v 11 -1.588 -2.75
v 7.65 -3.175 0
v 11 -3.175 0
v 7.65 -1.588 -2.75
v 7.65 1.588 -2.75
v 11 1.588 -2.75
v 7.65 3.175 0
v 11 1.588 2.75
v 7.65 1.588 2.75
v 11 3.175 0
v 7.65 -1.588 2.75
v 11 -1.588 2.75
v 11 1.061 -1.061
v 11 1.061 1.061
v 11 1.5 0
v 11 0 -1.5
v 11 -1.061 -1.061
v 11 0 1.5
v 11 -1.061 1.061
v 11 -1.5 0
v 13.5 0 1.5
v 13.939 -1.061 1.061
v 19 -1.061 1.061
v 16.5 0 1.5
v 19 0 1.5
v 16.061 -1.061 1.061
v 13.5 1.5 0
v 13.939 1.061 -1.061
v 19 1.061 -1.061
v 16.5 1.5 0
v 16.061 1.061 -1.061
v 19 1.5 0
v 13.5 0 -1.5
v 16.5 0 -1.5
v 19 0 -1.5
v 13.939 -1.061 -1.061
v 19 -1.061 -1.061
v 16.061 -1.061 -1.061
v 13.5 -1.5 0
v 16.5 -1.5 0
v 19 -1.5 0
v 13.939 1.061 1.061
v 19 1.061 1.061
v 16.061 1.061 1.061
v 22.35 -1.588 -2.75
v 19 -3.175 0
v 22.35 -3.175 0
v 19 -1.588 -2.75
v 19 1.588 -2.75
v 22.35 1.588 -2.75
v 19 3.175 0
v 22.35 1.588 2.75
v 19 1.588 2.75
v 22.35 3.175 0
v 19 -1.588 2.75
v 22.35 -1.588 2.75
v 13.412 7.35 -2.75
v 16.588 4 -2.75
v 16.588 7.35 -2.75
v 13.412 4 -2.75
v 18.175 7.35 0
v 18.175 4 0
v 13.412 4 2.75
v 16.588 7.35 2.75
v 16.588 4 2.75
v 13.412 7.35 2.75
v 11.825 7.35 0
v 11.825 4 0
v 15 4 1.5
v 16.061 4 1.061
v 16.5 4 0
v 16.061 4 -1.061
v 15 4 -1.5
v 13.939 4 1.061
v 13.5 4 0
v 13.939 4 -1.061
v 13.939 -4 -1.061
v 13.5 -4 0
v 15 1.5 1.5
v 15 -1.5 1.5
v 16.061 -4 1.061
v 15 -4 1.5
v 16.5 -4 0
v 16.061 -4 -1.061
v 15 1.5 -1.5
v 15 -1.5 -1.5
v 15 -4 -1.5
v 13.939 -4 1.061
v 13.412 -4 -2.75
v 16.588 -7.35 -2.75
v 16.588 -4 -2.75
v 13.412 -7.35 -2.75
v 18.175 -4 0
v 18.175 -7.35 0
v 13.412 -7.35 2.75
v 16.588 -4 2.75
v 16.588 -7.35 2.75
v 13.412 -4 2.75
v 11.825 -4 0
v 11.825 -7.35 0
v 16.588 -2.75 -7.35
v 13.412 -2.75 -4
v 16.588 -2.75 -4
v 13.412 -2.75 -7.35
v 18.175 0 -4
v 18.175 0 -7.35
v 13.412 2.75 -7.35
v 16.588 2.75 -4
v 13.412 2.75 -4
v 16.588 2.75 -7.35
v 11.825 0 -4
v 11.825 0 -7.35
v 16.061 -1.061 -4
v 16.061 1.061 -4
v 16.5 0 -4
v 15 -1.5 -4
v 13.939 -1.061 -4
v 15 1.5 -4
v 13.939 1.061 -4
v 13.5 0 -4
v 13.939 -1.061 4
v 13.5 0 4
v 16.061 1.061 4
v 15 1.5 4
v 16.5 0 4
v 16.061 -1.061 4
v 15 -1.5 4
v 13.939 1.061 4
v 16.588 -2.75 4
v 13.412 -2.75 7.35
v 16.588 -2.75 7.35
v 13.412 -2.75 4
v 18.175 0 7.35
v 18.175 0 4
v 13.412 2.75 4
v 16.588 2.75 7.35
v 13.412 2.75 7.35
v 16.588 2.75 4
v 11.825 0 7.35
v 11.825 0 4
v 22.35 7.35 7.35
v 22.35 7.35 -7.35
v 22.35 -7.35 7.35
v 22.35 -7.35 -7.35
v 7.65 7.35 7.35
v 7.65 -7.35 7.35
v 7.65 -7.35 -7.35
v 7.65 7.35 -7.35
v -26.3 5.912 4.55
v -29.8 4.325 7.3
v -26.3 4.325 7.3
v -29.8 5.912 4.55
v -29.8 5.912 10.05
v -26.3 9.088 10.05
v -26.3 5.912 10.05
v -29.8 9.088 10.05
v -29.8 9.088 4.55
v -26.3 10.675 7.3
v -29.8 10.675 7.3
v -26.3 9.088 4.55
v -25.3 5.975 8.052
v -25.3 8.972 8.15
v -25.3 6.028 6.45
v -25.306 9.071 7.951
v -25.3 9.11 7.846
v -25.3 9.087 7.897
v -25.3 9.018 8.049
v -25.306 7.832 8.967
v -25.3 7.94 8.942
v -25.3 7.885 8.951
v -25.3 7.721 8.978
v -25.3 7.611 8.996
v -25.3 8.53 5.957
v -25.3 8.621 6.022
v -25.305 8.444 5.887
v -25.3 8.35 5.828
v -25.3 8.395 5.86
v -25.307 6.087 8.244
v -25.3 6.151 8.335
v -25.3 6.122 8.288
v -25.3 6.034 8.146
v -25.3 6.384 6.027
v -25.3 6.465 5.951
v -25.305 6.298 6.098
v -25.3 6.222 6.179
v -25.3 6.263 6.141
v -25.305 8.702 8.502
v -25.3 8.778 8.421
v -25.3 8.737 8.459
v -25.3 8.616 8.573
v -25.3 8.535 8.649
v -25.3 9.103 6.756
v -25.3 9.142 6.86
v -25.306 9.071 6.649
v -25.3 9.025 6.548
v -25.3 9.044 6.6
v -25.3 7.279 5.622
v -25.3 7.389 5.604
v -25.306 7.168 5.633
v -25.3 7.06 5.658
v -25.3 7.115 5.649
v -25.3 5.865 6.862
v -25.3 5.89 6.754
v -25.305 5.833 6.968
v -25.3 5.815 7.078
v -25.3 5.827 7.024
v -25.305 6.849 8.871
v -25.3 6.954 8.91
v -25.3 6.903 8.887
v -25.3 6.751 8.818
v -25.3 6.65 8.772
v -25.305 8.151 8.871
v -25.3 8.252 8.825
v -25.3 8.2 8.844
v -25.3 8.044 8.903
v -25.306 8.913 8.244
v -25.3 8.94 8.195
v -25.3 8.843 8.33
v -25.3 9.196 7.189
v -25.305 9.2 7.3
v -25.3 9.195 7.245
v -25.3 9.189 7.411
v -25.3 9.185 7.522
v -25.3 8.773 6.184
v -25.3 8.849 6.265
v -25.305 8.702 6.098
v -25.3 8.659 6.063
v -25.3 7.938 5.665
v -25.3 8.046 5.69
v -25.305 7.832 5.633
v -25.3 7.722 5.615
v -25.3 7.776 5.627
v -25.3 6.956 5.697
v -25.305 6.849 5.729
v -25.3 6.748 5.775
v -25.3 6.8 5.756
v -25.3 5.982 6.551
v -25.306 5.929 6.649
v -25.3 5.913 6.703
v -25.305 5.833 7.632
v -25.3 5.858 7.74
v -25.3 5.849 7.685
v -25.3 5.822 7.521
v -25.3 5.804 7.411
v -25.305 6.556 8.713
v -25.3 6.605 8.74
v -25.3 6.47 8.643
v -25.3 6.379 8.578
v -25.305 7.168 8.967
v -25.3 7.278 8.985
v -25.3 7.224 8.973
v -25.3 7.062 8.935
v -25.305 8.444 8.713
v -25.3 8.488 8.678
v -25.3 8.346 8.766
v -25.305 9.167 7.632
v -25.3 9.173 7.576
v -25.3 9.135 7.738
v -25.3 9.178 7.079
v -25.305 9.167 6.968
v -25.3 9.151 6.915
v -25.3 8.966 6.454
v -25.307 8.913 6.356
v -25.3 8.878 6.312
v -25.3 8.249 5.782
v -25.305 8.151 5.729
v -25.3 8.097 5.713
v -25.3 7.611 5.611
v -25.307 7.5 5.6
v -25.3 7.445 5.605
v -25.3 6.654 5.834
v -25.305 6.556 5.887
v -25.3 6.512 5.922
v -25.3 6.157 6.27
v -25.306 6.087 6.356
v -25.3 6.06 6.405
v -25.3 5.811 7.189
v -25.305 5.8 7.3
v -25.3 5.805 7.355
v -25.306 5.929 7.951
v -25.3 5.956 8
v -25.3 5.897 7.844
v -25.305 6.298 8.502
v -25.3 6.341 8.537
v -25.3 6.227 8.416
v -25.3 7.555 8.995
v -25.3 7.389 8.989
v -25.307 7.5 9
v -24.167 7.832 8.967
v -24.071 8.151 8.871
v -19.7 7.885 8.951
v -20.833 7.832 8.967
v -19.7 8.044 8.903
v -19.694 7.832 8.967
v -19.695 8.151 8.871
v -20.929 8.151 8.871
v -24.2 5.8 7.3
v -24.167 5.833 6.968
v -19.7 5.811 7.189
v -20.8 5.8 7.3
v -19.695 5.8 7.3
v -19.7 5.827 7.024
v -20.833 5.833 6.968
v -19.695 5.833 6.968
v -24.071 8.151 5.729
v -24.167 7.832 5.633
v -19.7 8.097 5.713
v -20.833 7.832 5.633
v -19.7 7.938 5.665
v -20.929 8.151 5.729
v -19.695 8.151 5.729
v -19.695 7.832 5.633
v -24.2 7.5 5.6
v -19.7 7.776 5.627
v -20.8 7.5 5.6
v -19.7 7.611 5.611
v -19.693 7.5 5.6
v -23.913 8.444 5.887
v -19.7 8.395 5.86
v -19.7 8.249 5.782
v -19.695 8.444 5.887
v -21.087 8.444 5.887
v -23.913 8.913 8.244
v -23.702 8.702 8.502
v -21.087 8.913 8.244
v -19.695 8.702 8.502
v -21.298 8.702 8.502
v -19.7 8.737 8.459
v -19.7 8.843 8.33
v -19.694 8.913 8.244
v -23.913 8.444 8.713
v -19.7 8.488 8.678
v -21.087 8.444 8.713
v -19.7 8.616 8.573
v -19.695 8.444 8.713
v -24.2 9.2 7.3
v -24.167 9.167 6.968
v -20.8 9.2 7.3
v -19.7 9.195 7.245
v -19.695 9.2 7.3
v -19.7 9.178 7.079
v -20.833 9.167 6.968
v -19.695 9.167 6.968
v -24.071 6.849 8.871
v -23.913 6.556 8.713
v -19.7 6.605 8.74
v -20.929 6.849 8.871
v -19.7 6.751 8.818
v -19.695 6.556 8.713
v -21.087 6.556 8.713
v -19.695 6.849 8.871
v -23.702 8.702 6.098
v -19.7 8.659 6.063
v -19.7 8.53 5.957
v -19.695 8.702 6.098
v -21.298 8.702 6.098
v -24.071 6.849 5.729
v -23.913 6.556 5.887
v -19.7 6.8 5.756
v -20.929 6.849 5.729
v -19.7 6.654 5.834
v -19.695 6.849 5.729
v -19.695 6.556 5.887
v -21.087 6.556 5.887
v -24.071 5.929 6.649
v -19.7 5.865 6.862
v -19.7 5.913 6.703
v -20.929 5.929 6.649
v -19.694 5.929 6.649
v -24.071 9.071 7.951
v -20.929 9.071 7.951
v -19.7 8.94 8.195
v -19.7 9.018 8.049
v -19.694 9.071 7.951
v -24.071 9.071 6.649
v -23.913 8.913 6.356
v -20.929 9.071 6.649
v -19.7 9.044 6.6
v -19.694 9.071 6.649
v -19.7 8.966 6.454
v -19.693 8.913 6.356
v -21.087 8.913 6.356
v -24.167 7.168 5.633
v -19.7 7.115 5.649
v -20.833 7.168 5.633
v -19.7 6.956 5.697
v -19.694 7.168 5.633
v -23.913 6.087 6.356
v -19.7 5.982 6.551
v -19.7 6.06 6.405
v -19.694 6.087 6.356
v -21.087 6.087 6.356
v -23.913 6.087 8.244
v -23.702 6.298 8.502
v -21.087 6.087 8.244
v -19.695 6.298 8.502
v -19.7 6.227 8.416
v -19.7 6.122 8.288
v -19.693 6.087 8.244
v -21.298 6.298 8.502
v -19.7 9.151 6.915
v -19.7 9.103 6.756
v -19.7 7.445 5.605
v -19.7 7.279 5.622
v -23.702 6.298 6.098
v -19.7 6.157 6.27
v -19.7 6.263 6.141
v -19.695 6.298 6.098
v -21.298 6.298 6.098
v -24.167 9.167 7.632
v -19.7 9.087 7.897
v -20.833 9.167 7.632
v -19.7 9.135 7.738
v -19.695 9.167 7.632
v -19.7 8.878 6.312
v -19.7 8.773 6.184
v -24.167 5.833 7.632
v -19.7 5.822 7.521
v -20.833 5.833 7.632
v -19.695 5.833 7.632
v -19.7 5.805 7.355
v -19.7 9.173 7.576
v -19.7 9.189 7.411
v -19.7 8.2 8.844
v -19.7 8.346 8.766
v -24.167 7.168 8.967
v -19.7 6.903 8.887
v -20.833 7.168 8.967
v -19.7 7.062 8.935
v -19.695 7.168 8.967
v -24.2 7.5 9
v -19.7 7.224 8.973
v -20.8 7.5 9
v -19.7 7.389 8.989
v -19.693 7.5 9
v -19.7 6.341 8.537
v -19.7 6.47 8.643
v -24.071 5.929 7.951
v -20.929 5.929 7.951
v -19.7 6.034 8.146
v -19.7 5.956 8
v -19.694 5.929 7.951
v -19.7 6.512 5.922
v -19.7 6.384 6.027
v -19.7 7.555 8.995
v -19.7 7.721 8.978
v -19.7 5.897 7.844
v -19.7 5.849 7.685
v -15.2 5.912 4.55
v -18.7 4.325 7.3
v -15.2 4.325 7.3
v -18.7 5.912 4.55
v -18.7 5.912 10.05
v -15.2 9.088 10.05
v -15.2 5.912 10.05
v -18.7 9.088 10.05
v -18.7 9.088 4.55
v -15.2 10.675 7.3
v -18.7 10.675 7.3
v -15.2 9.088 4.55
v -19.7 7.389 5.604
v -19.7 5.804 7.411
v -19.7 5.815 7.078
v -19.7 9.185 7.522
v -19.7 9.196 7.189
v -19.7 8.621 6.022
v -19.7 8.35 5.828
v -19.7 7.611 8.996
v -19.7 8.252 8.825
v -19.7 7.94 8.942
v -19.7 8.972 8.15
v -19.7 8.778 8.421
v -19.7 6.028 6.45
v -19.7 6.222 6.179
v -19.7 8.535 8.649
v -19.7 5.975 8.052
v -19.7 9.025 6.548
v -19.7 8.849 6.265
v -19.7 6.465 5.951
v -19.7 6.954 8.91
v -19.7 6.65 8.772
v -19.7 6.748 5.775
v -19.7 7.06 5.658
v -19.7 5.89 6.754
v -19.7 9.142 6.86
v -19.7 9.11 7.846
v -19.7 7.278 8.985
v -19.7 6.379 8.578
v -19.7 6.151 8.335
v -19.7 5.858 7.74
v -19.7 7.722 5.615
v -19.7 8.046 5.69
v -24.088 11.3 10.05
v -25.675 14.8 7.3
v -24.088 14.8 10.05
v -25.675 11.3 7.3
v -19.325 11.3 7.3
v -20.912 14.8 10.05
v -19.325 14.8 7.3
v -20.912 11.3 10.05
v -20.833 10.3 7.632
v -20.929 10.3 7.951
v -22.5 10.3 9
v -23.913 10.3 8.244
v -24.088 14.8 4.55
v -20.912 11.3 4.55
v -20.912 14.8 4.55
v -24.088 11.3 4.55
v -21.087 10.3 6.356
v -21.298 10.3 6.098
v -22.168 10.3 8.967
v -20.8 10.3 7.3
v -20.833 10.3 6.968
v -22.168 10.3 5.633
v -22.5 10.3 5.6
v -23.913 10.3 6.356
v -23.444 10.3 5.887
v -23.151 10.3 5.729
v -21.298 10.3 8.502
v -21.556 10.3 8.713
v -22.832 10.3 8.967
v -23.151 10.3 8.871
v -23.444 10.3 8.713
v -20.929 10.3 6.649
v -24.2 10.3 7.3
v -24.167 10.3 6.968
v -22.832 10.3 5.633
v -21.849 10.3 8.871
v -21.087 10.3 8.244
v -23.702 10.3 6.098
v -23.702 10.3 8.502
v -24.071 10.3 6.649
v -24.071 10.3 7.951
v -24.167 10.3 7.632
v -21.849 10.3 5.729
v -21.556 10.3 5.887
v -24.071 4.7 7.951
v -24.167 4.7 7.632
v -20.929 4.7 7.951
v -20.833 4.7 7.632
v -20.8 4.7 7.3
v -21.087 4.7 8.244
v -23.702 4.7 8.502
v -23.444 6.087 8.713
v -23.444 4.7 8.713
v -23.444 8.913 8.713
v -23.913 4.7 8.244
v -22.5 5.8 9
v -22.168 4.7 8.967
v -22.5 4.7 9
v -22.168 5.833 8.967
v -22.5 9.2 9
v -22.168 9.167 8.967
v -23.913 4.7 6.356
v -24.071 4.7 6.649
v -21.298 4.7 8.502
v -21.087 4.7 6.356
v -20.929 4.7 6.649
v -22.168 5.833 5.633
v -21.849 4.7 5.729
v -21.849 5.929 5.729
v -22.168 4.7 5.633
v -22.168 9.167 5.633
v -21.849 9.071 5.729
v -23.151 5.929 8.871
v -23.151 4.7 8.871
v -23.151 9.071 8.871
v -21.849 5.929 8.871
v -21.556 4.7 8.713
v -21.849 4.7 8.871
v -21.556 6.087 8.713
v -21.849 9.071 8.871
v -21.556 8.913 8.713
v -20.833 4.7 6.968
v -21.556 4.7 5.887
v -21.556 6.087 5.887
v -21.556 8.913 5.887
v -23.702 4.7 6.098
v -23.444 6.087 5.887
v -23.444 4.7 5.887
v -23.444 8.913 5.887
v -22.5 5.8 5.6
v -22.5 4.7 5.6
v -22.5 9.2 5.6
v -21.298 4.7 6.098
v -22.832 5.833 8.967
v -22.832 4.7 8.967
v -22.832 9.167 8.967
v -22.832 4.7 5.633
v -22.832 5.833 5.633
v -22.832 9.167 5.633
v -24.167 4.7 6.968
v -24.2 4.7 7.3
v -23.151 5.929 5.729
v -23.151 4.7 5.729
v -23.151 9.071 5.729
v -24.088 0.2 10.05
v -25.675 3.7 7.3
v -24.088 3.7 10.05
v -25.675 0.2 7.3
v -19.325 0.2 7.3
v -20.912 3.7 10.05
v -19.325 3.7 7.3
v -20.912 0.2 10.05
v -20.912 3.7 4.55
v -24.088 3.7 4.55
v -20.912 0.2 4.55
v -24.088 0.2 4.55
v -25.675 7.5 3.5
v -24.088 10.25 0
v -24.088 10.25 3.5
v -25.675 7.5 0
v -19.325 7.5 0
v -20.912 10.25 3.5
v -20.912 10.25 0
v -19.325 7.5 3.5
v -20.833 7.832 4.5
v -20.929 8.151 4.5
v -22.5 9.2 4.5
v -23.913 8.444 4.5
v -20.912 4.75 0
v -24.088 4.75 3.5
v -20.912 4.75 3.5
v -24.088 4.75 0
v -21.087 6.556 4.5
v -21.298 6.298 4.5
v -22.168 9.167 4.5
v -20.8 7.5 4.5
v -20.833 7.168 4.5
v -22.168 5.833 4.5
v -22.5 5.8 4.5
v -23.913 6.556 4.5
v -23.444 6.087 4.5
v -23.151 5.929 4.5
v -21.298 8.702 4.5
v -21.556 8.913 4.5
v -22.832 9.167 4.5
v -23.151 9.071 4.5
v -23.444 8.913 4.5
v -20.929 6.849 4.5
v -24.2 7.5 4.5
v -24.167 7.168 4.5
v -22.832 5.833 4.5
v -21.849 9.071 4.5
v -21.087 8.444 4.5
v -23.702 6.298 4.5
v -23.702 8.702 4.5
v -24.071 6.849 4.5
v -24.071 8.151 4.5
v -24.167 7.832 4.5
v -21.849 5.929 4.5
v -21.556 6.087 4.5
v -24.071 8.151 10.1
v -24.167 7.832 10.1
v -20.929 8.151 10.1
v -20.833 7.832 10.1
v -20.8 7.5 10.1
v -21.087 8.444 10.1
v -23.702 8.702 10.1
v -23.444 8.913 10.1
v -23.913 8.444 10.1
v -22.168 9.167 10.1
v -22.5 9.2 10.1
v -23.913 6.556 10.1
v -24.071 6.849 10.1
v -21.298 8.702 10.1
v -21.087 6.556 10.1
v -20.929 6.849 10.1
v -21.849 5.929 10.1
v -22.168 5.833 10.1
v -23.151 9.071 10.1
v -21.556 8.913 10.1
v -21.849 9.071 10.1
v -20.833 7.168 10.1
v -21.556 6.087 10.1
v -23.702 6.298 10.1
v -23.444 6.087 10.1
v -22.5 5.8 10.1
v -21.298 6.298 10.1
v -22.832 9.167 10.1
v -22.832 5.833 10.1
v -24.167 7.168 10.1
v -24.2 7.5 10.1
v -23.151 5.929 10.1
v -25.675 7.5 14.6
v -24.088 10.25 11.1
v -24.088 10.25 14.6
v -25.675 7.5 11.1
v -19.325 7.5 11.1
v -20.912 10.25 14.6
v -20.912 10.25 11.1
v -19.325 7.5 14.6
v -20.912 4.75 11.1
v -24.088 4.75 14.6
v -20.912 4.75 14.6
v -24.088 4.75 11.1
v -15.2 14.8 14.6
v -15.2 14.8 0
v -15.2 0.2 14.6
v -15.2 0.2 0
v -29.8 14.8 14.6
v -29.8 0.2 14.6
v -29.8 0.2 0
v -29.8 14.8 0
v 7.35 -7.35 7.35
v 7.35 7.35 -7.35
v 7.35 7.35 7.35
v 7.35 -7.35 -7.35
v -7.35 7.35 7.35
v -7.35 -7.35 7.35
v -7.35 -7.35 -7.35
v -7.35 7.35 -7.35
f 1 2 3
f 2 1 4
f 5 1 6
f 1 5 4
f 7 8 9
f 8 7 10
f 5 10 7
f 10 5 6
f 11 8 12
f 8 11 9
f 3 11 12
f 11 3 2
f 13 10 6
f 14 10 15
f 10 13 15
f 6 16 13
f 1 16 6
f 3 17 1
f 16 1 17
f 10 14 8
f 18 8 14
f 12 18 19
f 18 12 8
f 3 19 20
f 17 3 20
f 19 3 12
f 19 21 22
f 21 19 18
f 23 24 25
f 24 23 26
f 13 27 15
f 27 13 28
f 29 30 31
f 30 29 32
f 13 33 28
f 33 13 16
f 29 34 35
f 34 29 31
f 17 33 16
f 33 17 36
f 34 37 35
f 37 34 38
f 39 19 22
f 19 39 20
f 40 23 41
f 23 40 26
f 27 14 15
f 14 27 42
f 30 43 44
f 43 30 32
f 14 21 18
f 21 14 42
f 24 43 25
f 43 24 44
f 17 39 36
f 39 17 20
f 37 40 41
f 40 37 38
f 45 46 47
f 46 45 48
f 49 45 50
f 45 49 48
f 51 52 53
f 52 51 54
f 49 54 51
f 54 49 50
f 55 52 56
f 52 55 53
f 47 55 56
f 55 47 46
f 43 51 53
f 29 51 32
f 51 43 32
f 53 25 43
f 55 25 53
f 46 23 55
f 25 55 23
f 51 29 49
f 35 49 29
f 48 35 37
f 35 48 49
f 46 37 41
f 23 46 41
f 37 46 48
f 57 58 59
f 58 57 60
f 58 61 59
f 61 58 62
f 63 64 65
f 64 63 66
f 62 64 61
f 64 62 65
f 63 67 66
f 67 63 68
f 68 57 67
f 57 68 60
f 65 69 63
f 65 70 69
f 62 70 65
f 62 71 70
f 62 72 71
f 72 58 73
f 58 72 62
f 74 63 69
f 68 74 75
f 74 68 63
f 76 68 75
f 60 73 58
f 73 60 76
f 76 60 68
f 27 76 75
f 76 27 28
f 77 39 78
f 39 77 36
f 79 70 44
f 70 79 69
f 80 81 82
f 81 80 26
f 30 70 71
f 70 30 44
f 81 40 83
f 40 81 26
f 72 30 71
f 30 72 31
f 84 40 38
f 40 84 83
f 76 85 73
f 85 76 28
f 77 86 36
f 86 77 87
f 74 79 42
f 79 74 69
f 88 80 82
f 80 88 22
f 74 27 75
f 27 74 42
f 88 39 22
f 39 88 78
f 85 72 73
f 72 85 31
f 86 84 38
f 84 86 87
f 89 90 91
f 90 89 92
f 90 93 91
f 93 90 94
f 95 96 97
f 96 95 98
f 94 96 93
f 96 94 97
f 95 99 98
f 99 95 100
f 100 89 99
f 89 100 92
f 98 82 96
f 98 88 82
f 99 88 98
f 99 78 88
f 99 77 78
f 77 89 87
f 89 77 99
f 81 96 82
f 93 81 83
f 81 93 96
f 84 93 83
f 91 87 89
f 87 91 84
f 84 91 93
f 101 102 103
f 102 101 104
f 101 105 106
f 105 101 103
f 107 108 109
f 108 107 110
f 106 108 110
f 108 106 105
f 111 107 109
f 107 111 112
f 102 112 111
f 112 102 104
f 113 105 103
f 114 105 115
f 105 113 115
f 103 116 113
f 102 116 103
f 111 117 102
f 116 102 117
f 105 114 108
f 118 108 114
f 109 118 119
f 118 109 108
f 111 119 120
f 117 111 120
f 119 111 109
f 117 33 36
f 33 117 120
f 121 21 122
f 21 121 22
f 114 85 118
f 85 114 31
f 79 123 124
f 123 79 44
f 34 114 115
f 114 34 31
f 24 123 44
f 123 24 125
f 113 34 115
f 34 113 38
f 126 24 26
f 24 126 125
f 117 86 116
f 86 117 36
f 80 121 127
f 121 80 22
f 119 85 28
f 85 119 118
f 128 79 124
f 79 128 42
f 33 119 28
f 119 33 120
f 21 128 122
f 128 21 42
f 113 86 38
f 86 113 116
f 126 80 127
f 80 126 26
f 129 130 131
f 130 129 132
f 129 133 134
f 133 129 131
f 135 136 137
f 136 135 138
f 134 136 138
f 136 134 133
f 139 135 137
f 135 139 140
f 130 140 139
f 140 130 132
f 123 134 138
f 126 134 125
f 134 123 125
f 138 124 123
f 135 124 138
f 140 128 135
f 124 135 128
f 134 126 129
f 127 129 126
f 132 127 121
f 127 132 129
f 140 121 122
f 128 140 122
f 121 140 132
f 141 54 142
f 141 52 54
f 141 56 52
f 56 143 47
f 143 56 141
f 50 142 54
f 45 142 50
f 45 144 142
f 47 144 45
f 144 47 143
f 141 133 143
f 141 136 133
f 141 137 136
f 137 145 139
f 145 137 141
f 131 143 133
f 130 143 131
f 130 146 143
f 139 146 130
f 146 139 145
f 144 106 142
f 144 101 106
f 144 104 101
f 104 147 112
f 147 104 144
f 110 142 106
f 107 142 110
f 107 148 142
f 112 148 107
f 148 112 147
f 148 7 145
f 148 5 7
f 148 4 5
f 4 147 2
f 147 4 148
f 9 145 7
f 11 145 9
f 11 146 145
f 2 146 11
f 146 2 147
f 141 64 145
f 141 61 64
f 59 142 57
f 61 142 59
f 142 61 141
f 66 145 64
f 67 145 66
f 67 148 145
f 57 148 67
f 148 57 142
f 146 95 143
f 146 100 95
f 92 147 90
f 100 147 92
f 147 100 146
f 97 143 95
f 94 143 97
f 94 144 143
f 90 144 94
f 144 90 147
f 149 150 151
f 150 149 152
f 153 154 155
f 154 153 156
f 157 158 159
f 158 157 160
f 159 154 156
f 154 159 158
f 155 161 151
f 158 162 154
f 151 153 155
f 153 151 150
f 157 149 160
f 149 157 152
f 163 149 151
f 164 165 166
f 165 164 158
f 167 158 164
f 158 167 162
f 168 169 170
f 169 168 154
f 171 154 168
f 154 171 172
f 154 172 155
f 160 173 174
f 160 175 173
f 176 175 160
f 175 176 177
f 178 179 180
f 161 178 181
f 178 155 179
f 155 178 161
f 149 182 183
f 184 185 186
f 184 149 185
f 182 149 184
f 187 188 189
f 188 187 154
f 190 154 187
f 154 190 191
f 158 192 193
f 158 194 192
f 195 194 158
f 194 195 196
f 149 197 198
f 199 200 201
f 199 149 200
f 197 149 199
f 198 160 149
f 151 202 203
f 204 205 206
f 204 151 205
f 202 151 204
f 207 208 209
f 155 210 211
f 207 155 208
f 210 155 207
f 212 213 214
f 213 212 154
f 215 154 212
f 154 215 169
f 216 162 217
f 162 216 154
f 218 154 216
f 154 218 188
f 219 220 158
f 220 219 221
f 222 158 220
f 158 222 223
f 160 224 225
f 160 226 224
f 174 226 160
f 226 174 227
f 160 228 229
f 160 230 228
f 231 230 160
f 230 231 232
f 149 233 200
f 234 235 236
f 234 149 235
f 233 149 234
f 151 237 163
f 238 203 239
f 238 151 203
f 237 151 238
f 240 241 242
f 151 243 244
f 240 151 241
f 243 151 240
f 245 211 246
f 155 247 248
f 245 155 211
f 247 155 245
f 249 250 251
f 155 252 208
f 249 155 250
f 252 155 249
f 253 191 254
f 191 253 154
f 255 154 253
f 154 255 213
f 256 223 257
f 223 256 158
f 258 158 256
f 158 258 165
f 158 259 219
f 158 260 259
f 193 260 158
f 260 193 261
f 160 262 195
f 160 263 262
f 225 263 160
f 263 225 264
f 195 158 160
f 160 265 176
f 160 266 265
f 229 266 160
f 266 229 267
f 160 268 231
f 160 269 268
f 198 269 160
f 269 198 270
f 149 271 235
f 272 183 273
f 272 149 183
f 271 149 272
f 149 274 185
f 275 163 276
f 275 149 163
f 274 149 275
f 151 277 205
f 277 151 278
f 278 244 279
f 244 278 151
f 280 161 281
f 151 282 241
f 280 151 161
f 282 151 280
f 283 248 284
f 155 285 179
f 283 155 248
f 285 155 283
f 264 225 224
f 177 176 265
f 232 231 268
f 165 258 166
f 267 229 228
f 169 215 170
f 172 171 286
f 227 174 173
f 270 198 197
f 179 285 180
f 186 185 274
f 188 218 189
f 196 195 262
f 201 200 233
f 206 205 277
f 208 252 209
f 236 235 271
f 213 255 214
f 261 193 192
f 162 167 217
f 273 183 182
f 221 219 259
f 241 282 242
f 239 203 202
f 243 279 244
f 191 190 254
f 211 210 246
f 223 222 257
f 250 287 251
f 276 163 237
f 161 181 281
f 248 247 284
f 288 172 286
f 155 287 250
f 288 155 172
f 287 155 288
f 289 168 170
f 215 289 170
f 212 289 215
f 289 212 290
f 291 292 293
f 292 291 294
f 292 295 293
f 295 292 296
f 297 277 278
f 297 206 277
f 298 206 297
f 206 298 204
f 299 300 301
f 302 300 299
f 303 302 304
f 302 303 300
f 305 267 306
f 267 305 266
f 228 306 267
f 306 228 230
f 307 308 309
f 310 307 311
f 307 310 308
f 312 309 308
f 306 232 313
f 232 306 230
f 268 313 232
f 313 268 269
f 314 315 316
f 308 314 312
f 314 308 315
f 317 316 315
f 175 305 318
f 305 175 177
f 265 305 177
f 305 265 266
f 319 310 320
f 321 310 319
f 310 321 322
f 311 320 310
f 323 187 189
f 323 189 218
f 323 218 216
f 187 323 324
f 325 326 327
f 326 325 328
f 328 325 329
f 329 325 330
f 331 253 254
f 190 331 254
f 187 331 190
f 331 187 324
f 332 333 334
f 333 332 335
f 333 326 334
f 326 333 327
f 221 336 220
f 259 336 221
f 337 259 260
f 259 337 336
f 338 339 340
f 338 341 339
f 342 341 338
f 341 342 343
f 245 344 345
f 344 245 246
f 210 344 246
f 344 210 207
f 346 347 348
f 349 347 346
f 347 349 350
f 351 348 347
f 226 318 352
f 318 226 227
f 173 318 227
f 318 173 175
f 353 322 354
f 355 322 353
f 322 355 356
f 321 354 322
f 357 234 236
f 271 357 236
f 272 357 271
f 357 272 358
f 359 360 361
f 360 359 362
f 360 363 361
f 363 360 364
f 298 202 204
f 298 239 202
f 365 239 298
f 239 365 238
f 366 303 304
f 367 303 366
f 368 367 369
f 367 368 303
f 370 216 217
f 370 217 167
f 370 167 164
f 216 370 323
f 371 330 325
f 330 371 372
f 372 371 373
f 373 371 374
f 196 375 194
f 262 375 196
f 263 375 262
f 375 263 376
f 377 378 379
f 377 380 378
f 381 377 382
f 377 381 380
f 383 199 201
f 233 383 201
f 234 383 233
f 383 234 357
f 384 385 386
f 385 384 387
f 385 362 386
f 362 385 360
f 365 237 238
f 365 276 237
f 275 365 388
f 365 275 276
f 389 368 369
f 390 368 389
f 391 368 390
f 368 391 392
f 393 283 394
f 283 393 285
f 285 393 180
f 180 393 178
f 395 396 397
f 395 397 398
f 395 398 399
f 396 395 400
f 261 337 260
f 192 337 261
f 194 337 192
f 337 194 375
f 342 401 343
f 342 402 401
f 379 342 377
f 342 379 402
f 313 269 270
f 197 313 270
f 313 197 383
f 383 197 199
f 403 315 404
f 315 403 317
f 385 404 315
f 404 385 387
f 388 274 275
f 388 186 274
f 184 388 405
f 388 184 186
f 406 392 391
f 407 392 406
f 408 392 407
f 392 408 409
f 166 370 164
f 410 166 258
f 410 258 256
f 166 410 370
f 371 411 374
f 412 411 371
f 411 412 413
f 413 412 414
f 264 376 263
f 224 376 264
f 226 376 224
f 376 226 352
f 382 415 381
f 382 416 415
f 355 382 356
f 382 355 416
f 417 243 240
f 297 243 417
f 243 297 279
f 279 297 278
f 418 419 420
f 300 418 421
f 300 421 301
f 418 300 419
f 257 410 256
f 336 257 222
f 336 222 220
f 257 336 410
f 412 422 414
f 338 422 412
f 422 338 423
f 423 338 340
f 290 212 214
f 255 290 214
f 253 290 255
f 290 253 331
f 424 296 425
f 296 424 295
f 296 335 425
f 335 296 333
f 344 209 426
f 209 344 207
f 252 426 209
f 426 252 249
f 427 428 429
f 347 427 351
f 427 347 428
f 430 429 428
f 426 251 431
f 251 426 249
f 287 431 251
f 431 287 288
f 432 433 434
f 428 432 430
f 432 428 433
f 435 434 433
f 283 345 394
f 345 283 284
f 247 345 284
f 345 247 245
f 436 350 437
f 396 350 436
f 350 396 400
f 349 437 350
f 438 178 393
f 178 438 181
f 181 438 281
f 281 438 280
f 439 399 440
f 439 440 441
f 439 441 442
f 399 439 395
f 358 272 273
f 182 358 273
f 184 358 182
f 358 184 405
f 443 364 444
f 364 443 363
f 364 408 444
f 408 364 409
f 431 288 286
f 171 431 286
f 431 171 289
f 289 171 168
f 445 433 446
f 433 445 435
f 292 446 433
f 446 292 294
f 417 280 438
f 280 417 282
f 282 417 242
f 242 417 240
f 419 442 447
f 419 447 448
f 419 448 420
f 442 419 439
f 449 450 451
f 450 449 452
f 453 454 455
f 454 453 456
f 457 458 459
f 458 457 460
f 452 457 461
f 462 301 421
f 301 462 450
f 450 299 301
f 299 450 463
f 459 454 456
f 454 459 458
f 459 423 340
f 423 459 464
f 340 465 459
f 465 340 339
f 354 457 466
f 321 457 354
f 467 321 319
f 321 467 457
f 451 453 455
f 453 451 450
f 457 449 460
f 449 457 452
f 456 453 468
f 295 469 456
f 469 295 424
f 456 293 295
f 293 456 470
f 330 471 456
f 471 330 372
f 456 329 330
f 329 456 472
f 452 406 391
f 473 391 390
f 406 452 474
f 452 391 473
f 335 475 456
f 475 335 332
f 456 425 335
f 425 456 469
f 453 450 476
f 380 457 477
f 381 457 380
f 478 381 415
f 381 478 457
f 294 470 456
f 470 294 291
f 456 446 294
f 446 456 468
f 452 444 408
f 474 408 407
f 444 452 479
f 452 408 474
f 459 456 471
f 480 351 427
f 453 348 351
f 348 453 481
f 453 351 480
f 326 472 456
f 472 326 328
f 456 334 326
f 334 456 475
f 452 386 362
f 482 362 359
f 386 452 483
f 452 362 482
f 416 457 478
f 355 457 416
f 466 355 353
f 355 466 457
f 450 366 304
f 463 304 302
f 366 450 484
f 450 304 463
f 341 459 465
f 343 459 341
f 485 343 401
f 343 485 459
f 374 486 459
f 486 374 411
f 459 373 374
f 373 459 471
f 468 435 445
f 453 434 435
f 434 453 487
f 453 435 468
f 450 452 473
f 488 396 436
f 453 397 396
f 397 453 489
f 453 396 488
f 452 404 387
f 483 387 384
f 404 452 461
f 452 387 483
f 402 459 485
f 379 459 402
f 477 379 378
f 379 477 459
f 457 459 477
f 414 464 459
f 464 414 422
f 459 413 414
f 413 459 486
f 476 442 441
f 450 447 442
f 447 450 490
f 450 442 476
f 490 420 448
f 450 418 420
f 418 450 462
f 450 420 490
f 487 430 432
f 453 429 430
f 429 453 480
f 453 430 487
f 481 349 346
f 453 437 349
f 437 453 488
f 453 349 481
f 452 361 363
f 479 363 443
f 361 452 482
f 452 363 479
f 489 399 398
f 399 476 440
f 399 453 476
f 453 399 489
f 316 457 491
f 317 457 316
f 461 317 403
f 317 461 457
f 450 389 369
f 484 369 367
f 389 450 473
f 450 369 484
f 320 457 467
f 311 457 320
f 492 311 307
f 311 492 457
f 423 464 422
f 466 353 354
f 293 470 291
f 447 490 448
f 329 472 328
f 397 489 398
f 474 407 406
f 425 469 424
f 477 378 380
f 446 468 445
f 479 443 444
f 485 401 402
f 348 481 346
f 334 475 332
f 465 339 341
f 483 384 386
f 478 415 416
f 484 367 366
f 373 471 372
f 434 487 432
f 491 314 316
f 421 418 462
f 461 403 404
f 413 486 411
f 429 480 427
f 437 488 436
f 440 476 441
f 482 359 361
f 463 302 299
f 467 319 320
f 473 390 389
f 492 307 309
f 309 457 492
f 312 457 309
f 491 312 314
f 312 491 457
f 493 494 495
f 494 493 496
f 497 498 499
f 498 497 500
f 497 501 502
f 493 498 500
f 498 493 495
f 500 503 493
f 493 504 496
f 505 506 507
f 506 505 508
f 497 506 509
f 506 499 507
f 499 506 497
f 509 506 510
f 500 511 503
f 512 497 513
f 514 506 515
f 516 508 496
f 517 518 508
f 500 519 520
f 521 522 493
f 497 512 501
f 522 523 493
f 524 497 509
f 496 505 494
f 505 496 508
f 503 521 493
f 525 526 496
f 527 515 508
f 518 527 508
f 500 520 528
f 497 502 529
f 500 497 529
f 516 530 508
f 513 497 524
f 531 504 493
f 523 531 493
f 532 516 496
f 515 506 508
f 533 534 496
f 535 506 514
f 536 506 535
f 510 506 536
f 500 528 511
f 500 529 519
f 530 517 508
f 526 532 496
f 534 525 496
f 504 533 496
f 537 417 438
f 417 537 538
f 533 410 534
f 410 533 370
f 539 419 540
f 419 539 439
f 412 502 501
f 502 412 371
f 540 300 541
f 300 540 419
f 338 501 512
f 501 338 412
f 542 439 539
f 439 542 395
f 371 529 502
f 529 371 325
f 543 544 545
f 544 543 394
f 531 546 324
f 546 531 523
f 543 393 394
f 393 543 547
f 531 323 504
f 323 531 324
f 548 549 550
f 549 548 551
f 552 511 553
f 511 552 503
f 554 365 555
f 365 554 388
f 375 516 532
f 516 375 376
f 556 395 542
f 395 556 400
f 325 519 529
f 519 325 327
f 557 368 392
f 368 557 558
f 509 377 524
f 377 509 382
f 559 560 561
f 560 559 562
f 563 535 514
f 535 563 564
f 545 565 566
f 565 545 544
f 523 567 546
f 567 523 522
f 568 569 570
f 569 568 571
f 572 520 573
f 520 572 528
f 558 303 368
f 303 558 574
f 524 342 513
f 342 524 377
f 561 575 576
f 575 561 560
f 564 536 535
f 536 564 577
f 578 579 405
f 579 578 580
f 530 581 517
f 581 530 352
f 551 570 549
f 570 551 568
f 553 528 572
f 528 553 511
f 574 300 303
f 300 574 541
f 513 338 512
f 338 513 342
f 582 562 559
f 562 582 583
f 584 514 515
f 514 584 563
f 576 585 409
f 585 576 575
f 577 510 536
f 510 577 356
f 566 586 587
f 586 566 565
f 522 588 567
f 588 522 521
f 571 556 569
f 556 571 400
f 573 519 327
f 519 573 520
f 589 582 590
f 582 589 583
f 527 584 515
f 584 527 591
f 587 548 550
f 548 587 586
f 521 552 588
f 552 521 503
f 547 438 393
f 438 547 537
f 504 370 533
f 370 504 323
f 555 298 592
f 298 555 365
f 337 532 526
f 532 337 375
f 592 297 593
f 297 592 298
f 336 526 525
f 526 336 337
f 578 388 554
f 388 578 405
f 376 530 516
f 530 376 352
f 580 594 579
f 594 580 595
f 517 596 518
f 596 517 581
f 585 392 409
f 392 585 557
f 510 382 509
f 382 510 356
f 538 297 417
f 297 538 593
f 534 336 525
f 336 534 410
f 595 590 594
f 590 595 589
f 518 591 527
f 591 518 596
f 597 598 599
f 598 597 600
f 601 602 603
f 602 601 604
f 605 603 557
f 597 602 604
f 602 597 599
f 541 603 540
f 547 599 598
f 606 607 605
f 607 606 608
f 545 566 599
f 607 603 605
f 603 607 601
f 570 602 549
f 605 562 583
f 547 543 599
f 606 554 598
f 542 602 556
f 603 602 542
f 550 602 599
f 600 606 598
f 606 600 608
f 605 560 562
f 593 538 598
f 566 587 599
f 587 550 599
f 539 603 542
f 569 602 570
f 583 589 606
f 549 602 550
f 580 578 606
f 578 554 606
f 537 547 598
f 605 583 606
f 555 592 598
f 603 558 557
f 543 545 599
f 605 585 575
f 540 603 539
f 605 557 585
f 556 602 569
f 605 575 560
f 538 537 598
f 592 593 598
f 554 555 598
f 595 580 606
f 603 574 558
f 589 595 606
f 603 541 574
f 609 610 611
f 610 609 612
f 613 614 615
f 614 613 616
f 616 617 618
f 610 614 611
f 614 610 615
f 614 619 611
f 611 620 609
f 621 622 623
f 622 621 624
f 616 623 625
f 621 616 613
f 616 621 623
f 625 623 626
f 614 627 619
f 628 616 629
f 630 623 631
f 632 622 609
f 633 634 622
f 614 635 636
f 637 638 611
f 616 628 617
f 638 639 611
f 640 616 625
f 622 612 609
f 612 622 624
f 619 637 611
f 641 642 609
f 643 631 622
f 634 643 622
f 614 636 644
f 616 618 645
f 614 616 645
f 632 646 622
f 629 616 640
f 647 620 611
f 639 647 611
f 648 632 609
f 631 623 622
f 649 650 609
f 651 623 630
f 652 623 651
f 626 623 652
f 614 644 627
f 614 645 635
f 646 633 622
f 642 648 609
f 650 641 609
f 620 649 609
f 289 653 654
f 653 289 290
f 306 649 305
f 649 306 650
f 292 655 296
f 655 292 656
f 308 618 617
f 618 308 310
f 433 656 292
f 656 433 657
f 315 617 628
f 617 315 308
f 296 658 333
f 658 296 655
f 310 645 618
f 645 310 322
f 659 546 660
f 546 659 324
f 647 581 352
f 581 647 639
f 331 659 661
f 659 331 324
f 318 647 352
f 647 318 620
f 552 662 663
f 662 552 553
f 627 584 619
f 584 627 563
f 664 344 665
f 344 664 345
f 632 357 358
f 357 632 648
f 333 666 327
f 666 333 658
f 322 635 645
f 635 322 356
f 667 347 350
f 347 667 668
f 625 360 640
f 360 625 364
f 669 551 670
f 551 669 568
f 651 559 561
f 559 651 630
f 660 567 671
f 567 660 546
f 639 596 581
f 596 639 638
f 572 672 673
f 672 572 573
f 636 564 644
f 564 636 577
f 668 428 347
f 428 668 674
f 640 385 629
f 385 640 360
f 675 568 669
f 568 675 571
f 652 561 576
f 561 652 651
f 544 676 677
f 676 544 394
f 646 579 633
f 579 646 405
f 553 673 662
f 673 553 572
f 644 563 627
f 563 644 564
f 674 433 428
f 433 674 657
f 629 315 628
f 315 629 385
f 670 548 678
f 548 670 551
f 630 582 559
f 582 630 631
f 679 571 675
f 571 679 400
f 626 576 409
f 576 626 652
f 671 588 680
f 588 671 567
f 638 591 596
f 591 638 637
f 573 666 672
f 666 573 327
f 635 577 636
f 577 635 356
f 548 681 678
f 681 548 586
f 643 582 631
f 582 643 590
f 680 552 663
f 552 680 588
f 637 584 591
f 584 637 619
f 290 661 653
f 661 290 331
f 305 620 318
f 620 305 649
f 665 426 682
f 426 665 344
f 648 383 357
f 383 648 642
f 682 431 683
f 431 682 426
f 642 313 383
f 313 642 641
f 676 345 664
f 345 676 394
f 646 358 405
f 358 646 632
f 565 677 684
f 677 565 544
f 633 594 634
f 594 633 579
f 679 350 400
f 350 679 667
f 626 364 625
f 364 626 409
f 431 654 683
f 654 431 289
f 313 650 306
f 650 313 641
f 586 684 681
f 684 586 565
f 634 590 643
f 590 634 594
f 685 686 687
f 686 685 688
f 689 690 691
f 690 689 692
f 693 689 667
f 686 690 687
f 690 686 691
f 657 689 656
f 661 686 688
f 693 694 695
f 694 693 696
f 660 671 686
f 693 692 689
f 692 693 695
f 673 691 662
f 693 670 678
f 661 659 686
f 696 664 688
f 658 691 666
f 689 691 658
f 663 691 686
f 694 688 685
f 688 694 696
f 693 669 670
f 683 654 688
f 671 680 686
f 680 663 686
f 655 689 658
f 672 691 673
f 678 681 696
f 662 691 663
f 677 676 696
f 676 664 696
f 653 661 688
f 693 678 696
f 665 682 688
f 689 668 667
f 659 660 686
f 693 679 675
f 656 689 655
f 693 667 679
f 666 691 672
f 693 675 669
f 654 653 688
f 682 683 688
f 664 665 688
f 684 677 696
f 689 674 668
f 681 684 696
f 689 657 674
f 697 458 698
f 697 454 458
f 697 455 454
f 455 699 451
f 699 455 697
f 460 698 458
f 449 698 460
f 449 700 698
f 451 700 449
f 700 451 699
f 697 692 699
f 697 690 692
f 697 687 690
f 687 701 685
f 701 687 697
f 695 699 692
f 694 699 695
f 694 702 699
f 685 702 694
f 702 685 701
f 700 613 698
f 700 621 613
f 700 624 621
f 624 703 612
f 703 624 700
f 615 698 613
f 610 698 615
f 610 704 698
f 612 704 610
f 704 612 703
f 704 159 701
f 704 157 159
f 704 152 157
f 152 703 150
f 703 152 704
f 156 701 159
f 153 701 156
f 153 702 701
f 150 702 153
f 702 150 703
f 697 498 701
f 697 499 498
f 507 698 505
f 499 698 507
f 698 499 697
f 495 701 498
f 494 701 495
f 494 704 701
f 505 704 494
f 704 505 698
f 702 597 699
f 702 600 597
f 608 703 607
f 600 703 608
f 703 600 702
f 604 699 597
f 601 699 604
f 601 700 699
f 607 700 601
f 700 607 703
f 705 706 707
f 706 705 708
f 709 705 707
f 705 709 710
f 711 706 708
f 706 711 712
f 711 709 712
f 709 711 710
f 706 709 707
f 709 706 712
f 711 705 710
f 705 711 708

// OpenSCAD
// Part number: 000003
// Part version: 0001
// Part name: Basic 1x1x1 brick
// Printable part


translate([15,0,0])
Part_000003_0001_Show();
Part_000003_0001_Show(simplify=true);

translate([-30,0,0])
Part_000003_0001_Print();


module Part_000003_0001_Show(simplify=false)
{
    S15_Basic_Brick(size_x=1,
                    size_y=1,
                    size_z=1,
                    simplify=simplify,
                    angular_resolution=8);
}

module Part_000003_0001_Print(fix_overhangs=true, overhang_factor=0.8, fitting=0.2)
{
    S15_Basic_Brick_Printable(  size_x=1,
                            size_y=1,
                            size_z=1,
                            fix_overhang=fix_overhangs,
                            overhang_factor=overhang_factor,
                            fitting=fitting,
                            angular_resolution=32);
}

module S15_Basic_Brick( size_x,
                        size_y,
                        size_z,
                        simplify=false,
                        angular_resolution=8)
{
    Basic_Brick(size_x=size_x,
                size_y=size_y,
                size_z=size_z,
                unit_size=15,
                nut_depth=3.5,
                wrench_size=5.5,
                bolt_diameter=3,
                simplify=simplify,
                angular_resolution=8);
}

module S15_Basic_Brick_Printable(   size_x,
                                    size_y,
                                    size_z,
                                    fix_overhang=true,
                                    overhang_factor=0.8,
                                    fitting=0.2,
                                    angular_resolution=32)
{
    Basic_Brick_Printable(  size_x=size_x,
                            size_y=size_y,
                            size_z=size_z,
                            unit_size=15,
                            nut_depth=3.5,
                            wrench_size=5.5,
                            bolt_diameter=3,
                            fix_overhang=fix_overhang,
                            overhang_factor=overhang_factor,
                            fitting=fitting,
                            angular_resolution=angular_resolution);
}

module Basic_Brick( size_x,
                    size_y,
                    size_z,
                    unit_size,
                    nut_depth,
                    wrench_size,
                    bolt_diameter,
                    simplify=false,
                    angular_resolution=8)
{
    space=unit_size*0.01;
    t=-0.5*unit_size;
    color("blue")  
    translate([t,t,t])
    if(simplify)
    {
        translate([space,space,space])
            Box([   size_x*unit_size-2*space,
                    size_y*unit_size-2*space,
                    size_z*unit_size-2*space    ],
                    t_x="pos",
                    t_y="pos",
                    t_z="pos");
    }
    else
    {   
        difference()
        {
            translate([space,space,space])
            Box([   size_x*unit_size-2*space,
                    size_y*unit_size-2*space,
                    size_z*unit_size-2*space    ],
                    t_x="pos",
                    t_y="pos",
                    t_z="pos");
            
            XYZ_Axis_Holes_Cutout(  size_x=size_x,
                                    size_y=size_y,
                                    size_z=size_z,
                                    unit_size=unit_size,
                                    nut_depth=nut_depth,
                                    wrench_size=wrench_size,
                                    bolt_diameter=bolt_diameter,
                                    fix_overhang=false,
                                    overhang_factor=0.8,
                                    fitting=0,
                                    angular_resolution=8); 
        }
    }
}

module Basic_Brick_Printable(   size_x,
                                size_y,
                                size_z,
                                unit_size,
                                nut_depth,
                                wrench_size,
                                bolt_diameter,
                                fix_overhang=true,
                                overhang_factor=0.8,
                                fitting=0.2,
                                angular_resolution=32)
{
    translate([0,0,-fitting])
    difference()
    {
        translate([fitting,fitting,fitting])
        Box([   size_x*unit_size-2*fitting,
                size_y*unit_size-2*fitting,
                size_z*unit_size-2*fitting    ],
                t_x="pos",
                t_y="pos",
                t_z="pos");
        
        XYZ_Axis_Holes_Cutout(  size_x=size_x,
                                size_y=size_y,
                                size_z=size_z,
                                unit_size=unit_size,
                                nut_depth=nut_depth,
                                wrench_size=wrench_size,
                                bolt_diameter=bolt_diameter,
                                fix_overhang=fix_overhang,
                                overhang_factor=overhang_factor,
                                fitting=fitting,
                                angular_resolution=angular_resolution); 
    }
}

module Bolt_Hole_Cutout(brick_width,
                        nut_depth,
                        wrench_size,
                        bolt_diameter,
                        turned=false,
                        fix_overhang=true,
                        overhang_factor=0.8,
                        fitting=0.2,
                        angular_resolution=32)
{
    translate([0,0,-brick_width/2])
    union()
    {
        Hex_Nut_Cutout( thread_diameter=bolt_diameter,
                        wrench_size= wrench_size,
                        height=nut_depth*2,
                        turned=turned,
                        fix_overhang=fix_overhang,
                        overhang_factor=overhang_factor,
                        fitting=fitting);

        Cylinder(   diameter=bolt_diameter+2*fitting,
                    height=brick_width+2*fitting,
                    t_z="pos",
                    angular_resolution=angular_resolution);
        translate([0,0,brick_width])
            Hex_Nut_Cutout( thread_diameter=bolt_diameter,
                            wrench_size= wrench_size,
                            height=nut_depth*2,
                            turned=turned,
                            fix_overhang=fix_overhang,
                            overhang_factor=overhang_factor,
                            fitting=fitting);
        }
}


module X_Axis_Holes_Cutout( size_x,
                            size_y,
                            size_z,
                            unit_size,
                            nut_depth,
                            wrench_size,
                            bolt_diameter,
                            fix_overhang=false,
                            overhang_factor=0.8,
                            fitting=0.2,
                            angular_resolution=32)
{
    for(y=[0:size_y-1])
    {
        for(z=[0:size_z-1])
        {
            translate([0.5*size_x*unit_size, (y+0.5)*unit_size, (z+0.5)*unit_size,])
            rotate([0,90,0])
            Bolt_Hole_Cutout(   size_x*unit_size,
                                nut_depth=nut_depth,
                                wrench_size=wrench_size,
                                bolt_diameter=bolt_diameter,
                                turned=true,
                                fix_overhang=fix_overhang,
                                overhang_factor=overhang_factor,
                                fitting=fitting,
                                angular_resolution=angular_resolution);
        }
    }
}

module Y_Axis_Holes_Cutout( size_x,
                            size_y,
                            size_z,
                            unit_size,
                            nut_depth,
                            wrench_size,
                            bolt_diameter,
                            fix_overhang=false,
                            overhang_factor=0.8,
                            fitting=0.2,
                            angular_resolution=32)
{
    for(x=[0:size_x-1])
    {
        for(z=[0:size_z-1])
        {
            translate([(x+0.5)*unit_size, 0.5*size_y*unit_size,(z+0.5)*unit_size,])
            rotate([90,0,0])
            Bolt_Hole_Cutout(   size_y*unit_size,
                                nut_depth=nut_depth,
                                wrench_size=wrench_size,
                                bolt_diameter=bolt_diameter,
                                turned=false,
                                fix_overhang=fix_overhang,
                                overhang_factor=overhang_factor,
                                fitting=fitting,
                                angular_resolution=angular_resolution);
        }
    }
}

module Z_Axis_Holes_Cutout( size_x,
                            size_y,
                            size_z,
                            unit_size,
                            nut_depth,
                            wrench_size,
                            bolt_diameter,
                            turned=false,
                            fix_overhang=true,
                            overhang_factor=0.8,
                            fitting=0.2,
                            angular_resolution=32)
{
    for(x=[0:size_x-1])
    {
        for(y=[0:size_y-1])
        {
            translate([(x+0.5)*unit_size, (y+0.5)*unit_size, 0.5*size_z*unit_size])
            Bolt_Hole_Cutout(   size_z*unit_size,
                                nut_depth=nut_depth,
                                wrench_size=wrench_size,
                                bolt_diameter=bolt_diameter,
                                turned=false,
                                fix_overhang=fix_overhang,
                                overhang_factor=overhang_factor,
                                fitting=fitting,
                                angular_resolution=angular_resolution);
        }
    }
}

module XYZ_Axis_Holes_Cutout(   size_x,
                                size_y,
                                size_z,
                                unit_size,
                                nut_depth,
                                wrench_size,
                                bolt_diameter,
                                fix_overhang=false,
                                overhang_factor=0.8,
                                fitting=0.2,
                                angular_resolution=32)
{
    X_Axis_Holes_Cutout(size_x=size_x,
                        size_y=size_y,
                        size_z=size_z,
                        unit_size=unit_size,
                        nut_depth=nut_depth,
                        wrench_size=wrench_size,
                        bolt_diameter=bolt_diameter,
                        fix_overhang=fix_overhang,
                        overhang_factor=overhang_factor,
                        fitting=fitting,
                        angular_resolution=angular_resolution);
                    
    Y_Axis_Holes_Cutout(size_x=size_x,
                        size_y=size_y,
                        size_z=size_z,
                        unit_size=unit_size,
                        nut_depth=nut_depth,
                        wrench_size=wrench_size,
                        bolt_diameter=bolt_diameter,
                        fix_overhang=fix_overhang,
                        overhang_factor=overhang_factor,
                        fitting=fitting,
                        angular_resolution=angular_resolution);
                    
    Z_Axis_Holes_Cutout(size_x=size_x,
                        size_y=size_y,
                        size_z=size_z,
                        unit_size=unit_size,
                        nut_depth=nut_depth,
                        wrench_size=wrench_size,
                        bolt_diameter=bolt_diameter,
                        fix_overhang=fix_overhang,
                        overhang_factor=overhang_factor,
                        fitting=fitting,
                        angular_resolution=angular_resolution);
}

module Hex_Nut_Cutout(  thread_diameter,
                        wrench_size,
                        height,
                        turned=false,
                        fix_overhang=false,
                        overhang_factor=0.8,
                        fitting=0.2)
{
    fitted_wrench_size = wrench_size + 2*fitting;
    fitted_thread_diameter = thread_diameter+2*fitting;
    fitted_height = height + 2*fitting;
    rot = turned ? 30 : 0;
    diameter = 2*wrench_size/sqrt(3);
    rotate([0,0,rot]) 
    if(fix_overhang)
    {
        hull()
        {
            ch = fitted_height + 
                 (fitted_wrench_size-fitted_thread_diameter)*overhang_factor;
            
            Cylinder(   diameter=fitted_thread_diameter,
                        height=ch,
                        angular_resolution=32);
            
            Cylinder(   diameter=diameter,
                        height=fitted_height,
                        angular_resolution=6);
        }
    }
    else
    {
        Cylinder(   diameter=2*wrench_size/sqrt(3),
                    height=fitted_height,
                    angular_resolution=6);
    }    
}

module Box(dimensions, t_x="center", t_y="center", t_z="center")
{
    tx = t_x == "neg" ? -dimensions[0]/2 : 
            t_x == "pos" ? dimensions[0]/2 : 0;
    ty = t_y == "neg" ? -dimensions[1]/2 : 
            t_y == "pos" ? dimensions[1]/2 : 0;
    tz = t_z == "neg" ? -dimensions[2]/2 : 
            t_z == "pos" ? dimensions[2]/2 : 0;
    translate([tx, ty, tz])
        cube(dimensions, center=true);
}

module Cylinder(diameter, height, t_x="center", t_y="center", t_z="center", angular_resolution=32)
{
    tx = t_x == "neg" ? -diameter/2 : 
            t_x == "pos" ? diameter/2 : 0;
    ty = t_y == "neg" ? -diameter/2 : 
            t_y == "pos" ? diameter/2 : 0;
    tz = t_z == "neg" ? -height/2 : 
            t_z == "pos" ? height/2 : 0;
    translate([tx,ty,tz])
        cylinder(d=diameter, h=height, center=true, $fn=angular_resolution);
}
